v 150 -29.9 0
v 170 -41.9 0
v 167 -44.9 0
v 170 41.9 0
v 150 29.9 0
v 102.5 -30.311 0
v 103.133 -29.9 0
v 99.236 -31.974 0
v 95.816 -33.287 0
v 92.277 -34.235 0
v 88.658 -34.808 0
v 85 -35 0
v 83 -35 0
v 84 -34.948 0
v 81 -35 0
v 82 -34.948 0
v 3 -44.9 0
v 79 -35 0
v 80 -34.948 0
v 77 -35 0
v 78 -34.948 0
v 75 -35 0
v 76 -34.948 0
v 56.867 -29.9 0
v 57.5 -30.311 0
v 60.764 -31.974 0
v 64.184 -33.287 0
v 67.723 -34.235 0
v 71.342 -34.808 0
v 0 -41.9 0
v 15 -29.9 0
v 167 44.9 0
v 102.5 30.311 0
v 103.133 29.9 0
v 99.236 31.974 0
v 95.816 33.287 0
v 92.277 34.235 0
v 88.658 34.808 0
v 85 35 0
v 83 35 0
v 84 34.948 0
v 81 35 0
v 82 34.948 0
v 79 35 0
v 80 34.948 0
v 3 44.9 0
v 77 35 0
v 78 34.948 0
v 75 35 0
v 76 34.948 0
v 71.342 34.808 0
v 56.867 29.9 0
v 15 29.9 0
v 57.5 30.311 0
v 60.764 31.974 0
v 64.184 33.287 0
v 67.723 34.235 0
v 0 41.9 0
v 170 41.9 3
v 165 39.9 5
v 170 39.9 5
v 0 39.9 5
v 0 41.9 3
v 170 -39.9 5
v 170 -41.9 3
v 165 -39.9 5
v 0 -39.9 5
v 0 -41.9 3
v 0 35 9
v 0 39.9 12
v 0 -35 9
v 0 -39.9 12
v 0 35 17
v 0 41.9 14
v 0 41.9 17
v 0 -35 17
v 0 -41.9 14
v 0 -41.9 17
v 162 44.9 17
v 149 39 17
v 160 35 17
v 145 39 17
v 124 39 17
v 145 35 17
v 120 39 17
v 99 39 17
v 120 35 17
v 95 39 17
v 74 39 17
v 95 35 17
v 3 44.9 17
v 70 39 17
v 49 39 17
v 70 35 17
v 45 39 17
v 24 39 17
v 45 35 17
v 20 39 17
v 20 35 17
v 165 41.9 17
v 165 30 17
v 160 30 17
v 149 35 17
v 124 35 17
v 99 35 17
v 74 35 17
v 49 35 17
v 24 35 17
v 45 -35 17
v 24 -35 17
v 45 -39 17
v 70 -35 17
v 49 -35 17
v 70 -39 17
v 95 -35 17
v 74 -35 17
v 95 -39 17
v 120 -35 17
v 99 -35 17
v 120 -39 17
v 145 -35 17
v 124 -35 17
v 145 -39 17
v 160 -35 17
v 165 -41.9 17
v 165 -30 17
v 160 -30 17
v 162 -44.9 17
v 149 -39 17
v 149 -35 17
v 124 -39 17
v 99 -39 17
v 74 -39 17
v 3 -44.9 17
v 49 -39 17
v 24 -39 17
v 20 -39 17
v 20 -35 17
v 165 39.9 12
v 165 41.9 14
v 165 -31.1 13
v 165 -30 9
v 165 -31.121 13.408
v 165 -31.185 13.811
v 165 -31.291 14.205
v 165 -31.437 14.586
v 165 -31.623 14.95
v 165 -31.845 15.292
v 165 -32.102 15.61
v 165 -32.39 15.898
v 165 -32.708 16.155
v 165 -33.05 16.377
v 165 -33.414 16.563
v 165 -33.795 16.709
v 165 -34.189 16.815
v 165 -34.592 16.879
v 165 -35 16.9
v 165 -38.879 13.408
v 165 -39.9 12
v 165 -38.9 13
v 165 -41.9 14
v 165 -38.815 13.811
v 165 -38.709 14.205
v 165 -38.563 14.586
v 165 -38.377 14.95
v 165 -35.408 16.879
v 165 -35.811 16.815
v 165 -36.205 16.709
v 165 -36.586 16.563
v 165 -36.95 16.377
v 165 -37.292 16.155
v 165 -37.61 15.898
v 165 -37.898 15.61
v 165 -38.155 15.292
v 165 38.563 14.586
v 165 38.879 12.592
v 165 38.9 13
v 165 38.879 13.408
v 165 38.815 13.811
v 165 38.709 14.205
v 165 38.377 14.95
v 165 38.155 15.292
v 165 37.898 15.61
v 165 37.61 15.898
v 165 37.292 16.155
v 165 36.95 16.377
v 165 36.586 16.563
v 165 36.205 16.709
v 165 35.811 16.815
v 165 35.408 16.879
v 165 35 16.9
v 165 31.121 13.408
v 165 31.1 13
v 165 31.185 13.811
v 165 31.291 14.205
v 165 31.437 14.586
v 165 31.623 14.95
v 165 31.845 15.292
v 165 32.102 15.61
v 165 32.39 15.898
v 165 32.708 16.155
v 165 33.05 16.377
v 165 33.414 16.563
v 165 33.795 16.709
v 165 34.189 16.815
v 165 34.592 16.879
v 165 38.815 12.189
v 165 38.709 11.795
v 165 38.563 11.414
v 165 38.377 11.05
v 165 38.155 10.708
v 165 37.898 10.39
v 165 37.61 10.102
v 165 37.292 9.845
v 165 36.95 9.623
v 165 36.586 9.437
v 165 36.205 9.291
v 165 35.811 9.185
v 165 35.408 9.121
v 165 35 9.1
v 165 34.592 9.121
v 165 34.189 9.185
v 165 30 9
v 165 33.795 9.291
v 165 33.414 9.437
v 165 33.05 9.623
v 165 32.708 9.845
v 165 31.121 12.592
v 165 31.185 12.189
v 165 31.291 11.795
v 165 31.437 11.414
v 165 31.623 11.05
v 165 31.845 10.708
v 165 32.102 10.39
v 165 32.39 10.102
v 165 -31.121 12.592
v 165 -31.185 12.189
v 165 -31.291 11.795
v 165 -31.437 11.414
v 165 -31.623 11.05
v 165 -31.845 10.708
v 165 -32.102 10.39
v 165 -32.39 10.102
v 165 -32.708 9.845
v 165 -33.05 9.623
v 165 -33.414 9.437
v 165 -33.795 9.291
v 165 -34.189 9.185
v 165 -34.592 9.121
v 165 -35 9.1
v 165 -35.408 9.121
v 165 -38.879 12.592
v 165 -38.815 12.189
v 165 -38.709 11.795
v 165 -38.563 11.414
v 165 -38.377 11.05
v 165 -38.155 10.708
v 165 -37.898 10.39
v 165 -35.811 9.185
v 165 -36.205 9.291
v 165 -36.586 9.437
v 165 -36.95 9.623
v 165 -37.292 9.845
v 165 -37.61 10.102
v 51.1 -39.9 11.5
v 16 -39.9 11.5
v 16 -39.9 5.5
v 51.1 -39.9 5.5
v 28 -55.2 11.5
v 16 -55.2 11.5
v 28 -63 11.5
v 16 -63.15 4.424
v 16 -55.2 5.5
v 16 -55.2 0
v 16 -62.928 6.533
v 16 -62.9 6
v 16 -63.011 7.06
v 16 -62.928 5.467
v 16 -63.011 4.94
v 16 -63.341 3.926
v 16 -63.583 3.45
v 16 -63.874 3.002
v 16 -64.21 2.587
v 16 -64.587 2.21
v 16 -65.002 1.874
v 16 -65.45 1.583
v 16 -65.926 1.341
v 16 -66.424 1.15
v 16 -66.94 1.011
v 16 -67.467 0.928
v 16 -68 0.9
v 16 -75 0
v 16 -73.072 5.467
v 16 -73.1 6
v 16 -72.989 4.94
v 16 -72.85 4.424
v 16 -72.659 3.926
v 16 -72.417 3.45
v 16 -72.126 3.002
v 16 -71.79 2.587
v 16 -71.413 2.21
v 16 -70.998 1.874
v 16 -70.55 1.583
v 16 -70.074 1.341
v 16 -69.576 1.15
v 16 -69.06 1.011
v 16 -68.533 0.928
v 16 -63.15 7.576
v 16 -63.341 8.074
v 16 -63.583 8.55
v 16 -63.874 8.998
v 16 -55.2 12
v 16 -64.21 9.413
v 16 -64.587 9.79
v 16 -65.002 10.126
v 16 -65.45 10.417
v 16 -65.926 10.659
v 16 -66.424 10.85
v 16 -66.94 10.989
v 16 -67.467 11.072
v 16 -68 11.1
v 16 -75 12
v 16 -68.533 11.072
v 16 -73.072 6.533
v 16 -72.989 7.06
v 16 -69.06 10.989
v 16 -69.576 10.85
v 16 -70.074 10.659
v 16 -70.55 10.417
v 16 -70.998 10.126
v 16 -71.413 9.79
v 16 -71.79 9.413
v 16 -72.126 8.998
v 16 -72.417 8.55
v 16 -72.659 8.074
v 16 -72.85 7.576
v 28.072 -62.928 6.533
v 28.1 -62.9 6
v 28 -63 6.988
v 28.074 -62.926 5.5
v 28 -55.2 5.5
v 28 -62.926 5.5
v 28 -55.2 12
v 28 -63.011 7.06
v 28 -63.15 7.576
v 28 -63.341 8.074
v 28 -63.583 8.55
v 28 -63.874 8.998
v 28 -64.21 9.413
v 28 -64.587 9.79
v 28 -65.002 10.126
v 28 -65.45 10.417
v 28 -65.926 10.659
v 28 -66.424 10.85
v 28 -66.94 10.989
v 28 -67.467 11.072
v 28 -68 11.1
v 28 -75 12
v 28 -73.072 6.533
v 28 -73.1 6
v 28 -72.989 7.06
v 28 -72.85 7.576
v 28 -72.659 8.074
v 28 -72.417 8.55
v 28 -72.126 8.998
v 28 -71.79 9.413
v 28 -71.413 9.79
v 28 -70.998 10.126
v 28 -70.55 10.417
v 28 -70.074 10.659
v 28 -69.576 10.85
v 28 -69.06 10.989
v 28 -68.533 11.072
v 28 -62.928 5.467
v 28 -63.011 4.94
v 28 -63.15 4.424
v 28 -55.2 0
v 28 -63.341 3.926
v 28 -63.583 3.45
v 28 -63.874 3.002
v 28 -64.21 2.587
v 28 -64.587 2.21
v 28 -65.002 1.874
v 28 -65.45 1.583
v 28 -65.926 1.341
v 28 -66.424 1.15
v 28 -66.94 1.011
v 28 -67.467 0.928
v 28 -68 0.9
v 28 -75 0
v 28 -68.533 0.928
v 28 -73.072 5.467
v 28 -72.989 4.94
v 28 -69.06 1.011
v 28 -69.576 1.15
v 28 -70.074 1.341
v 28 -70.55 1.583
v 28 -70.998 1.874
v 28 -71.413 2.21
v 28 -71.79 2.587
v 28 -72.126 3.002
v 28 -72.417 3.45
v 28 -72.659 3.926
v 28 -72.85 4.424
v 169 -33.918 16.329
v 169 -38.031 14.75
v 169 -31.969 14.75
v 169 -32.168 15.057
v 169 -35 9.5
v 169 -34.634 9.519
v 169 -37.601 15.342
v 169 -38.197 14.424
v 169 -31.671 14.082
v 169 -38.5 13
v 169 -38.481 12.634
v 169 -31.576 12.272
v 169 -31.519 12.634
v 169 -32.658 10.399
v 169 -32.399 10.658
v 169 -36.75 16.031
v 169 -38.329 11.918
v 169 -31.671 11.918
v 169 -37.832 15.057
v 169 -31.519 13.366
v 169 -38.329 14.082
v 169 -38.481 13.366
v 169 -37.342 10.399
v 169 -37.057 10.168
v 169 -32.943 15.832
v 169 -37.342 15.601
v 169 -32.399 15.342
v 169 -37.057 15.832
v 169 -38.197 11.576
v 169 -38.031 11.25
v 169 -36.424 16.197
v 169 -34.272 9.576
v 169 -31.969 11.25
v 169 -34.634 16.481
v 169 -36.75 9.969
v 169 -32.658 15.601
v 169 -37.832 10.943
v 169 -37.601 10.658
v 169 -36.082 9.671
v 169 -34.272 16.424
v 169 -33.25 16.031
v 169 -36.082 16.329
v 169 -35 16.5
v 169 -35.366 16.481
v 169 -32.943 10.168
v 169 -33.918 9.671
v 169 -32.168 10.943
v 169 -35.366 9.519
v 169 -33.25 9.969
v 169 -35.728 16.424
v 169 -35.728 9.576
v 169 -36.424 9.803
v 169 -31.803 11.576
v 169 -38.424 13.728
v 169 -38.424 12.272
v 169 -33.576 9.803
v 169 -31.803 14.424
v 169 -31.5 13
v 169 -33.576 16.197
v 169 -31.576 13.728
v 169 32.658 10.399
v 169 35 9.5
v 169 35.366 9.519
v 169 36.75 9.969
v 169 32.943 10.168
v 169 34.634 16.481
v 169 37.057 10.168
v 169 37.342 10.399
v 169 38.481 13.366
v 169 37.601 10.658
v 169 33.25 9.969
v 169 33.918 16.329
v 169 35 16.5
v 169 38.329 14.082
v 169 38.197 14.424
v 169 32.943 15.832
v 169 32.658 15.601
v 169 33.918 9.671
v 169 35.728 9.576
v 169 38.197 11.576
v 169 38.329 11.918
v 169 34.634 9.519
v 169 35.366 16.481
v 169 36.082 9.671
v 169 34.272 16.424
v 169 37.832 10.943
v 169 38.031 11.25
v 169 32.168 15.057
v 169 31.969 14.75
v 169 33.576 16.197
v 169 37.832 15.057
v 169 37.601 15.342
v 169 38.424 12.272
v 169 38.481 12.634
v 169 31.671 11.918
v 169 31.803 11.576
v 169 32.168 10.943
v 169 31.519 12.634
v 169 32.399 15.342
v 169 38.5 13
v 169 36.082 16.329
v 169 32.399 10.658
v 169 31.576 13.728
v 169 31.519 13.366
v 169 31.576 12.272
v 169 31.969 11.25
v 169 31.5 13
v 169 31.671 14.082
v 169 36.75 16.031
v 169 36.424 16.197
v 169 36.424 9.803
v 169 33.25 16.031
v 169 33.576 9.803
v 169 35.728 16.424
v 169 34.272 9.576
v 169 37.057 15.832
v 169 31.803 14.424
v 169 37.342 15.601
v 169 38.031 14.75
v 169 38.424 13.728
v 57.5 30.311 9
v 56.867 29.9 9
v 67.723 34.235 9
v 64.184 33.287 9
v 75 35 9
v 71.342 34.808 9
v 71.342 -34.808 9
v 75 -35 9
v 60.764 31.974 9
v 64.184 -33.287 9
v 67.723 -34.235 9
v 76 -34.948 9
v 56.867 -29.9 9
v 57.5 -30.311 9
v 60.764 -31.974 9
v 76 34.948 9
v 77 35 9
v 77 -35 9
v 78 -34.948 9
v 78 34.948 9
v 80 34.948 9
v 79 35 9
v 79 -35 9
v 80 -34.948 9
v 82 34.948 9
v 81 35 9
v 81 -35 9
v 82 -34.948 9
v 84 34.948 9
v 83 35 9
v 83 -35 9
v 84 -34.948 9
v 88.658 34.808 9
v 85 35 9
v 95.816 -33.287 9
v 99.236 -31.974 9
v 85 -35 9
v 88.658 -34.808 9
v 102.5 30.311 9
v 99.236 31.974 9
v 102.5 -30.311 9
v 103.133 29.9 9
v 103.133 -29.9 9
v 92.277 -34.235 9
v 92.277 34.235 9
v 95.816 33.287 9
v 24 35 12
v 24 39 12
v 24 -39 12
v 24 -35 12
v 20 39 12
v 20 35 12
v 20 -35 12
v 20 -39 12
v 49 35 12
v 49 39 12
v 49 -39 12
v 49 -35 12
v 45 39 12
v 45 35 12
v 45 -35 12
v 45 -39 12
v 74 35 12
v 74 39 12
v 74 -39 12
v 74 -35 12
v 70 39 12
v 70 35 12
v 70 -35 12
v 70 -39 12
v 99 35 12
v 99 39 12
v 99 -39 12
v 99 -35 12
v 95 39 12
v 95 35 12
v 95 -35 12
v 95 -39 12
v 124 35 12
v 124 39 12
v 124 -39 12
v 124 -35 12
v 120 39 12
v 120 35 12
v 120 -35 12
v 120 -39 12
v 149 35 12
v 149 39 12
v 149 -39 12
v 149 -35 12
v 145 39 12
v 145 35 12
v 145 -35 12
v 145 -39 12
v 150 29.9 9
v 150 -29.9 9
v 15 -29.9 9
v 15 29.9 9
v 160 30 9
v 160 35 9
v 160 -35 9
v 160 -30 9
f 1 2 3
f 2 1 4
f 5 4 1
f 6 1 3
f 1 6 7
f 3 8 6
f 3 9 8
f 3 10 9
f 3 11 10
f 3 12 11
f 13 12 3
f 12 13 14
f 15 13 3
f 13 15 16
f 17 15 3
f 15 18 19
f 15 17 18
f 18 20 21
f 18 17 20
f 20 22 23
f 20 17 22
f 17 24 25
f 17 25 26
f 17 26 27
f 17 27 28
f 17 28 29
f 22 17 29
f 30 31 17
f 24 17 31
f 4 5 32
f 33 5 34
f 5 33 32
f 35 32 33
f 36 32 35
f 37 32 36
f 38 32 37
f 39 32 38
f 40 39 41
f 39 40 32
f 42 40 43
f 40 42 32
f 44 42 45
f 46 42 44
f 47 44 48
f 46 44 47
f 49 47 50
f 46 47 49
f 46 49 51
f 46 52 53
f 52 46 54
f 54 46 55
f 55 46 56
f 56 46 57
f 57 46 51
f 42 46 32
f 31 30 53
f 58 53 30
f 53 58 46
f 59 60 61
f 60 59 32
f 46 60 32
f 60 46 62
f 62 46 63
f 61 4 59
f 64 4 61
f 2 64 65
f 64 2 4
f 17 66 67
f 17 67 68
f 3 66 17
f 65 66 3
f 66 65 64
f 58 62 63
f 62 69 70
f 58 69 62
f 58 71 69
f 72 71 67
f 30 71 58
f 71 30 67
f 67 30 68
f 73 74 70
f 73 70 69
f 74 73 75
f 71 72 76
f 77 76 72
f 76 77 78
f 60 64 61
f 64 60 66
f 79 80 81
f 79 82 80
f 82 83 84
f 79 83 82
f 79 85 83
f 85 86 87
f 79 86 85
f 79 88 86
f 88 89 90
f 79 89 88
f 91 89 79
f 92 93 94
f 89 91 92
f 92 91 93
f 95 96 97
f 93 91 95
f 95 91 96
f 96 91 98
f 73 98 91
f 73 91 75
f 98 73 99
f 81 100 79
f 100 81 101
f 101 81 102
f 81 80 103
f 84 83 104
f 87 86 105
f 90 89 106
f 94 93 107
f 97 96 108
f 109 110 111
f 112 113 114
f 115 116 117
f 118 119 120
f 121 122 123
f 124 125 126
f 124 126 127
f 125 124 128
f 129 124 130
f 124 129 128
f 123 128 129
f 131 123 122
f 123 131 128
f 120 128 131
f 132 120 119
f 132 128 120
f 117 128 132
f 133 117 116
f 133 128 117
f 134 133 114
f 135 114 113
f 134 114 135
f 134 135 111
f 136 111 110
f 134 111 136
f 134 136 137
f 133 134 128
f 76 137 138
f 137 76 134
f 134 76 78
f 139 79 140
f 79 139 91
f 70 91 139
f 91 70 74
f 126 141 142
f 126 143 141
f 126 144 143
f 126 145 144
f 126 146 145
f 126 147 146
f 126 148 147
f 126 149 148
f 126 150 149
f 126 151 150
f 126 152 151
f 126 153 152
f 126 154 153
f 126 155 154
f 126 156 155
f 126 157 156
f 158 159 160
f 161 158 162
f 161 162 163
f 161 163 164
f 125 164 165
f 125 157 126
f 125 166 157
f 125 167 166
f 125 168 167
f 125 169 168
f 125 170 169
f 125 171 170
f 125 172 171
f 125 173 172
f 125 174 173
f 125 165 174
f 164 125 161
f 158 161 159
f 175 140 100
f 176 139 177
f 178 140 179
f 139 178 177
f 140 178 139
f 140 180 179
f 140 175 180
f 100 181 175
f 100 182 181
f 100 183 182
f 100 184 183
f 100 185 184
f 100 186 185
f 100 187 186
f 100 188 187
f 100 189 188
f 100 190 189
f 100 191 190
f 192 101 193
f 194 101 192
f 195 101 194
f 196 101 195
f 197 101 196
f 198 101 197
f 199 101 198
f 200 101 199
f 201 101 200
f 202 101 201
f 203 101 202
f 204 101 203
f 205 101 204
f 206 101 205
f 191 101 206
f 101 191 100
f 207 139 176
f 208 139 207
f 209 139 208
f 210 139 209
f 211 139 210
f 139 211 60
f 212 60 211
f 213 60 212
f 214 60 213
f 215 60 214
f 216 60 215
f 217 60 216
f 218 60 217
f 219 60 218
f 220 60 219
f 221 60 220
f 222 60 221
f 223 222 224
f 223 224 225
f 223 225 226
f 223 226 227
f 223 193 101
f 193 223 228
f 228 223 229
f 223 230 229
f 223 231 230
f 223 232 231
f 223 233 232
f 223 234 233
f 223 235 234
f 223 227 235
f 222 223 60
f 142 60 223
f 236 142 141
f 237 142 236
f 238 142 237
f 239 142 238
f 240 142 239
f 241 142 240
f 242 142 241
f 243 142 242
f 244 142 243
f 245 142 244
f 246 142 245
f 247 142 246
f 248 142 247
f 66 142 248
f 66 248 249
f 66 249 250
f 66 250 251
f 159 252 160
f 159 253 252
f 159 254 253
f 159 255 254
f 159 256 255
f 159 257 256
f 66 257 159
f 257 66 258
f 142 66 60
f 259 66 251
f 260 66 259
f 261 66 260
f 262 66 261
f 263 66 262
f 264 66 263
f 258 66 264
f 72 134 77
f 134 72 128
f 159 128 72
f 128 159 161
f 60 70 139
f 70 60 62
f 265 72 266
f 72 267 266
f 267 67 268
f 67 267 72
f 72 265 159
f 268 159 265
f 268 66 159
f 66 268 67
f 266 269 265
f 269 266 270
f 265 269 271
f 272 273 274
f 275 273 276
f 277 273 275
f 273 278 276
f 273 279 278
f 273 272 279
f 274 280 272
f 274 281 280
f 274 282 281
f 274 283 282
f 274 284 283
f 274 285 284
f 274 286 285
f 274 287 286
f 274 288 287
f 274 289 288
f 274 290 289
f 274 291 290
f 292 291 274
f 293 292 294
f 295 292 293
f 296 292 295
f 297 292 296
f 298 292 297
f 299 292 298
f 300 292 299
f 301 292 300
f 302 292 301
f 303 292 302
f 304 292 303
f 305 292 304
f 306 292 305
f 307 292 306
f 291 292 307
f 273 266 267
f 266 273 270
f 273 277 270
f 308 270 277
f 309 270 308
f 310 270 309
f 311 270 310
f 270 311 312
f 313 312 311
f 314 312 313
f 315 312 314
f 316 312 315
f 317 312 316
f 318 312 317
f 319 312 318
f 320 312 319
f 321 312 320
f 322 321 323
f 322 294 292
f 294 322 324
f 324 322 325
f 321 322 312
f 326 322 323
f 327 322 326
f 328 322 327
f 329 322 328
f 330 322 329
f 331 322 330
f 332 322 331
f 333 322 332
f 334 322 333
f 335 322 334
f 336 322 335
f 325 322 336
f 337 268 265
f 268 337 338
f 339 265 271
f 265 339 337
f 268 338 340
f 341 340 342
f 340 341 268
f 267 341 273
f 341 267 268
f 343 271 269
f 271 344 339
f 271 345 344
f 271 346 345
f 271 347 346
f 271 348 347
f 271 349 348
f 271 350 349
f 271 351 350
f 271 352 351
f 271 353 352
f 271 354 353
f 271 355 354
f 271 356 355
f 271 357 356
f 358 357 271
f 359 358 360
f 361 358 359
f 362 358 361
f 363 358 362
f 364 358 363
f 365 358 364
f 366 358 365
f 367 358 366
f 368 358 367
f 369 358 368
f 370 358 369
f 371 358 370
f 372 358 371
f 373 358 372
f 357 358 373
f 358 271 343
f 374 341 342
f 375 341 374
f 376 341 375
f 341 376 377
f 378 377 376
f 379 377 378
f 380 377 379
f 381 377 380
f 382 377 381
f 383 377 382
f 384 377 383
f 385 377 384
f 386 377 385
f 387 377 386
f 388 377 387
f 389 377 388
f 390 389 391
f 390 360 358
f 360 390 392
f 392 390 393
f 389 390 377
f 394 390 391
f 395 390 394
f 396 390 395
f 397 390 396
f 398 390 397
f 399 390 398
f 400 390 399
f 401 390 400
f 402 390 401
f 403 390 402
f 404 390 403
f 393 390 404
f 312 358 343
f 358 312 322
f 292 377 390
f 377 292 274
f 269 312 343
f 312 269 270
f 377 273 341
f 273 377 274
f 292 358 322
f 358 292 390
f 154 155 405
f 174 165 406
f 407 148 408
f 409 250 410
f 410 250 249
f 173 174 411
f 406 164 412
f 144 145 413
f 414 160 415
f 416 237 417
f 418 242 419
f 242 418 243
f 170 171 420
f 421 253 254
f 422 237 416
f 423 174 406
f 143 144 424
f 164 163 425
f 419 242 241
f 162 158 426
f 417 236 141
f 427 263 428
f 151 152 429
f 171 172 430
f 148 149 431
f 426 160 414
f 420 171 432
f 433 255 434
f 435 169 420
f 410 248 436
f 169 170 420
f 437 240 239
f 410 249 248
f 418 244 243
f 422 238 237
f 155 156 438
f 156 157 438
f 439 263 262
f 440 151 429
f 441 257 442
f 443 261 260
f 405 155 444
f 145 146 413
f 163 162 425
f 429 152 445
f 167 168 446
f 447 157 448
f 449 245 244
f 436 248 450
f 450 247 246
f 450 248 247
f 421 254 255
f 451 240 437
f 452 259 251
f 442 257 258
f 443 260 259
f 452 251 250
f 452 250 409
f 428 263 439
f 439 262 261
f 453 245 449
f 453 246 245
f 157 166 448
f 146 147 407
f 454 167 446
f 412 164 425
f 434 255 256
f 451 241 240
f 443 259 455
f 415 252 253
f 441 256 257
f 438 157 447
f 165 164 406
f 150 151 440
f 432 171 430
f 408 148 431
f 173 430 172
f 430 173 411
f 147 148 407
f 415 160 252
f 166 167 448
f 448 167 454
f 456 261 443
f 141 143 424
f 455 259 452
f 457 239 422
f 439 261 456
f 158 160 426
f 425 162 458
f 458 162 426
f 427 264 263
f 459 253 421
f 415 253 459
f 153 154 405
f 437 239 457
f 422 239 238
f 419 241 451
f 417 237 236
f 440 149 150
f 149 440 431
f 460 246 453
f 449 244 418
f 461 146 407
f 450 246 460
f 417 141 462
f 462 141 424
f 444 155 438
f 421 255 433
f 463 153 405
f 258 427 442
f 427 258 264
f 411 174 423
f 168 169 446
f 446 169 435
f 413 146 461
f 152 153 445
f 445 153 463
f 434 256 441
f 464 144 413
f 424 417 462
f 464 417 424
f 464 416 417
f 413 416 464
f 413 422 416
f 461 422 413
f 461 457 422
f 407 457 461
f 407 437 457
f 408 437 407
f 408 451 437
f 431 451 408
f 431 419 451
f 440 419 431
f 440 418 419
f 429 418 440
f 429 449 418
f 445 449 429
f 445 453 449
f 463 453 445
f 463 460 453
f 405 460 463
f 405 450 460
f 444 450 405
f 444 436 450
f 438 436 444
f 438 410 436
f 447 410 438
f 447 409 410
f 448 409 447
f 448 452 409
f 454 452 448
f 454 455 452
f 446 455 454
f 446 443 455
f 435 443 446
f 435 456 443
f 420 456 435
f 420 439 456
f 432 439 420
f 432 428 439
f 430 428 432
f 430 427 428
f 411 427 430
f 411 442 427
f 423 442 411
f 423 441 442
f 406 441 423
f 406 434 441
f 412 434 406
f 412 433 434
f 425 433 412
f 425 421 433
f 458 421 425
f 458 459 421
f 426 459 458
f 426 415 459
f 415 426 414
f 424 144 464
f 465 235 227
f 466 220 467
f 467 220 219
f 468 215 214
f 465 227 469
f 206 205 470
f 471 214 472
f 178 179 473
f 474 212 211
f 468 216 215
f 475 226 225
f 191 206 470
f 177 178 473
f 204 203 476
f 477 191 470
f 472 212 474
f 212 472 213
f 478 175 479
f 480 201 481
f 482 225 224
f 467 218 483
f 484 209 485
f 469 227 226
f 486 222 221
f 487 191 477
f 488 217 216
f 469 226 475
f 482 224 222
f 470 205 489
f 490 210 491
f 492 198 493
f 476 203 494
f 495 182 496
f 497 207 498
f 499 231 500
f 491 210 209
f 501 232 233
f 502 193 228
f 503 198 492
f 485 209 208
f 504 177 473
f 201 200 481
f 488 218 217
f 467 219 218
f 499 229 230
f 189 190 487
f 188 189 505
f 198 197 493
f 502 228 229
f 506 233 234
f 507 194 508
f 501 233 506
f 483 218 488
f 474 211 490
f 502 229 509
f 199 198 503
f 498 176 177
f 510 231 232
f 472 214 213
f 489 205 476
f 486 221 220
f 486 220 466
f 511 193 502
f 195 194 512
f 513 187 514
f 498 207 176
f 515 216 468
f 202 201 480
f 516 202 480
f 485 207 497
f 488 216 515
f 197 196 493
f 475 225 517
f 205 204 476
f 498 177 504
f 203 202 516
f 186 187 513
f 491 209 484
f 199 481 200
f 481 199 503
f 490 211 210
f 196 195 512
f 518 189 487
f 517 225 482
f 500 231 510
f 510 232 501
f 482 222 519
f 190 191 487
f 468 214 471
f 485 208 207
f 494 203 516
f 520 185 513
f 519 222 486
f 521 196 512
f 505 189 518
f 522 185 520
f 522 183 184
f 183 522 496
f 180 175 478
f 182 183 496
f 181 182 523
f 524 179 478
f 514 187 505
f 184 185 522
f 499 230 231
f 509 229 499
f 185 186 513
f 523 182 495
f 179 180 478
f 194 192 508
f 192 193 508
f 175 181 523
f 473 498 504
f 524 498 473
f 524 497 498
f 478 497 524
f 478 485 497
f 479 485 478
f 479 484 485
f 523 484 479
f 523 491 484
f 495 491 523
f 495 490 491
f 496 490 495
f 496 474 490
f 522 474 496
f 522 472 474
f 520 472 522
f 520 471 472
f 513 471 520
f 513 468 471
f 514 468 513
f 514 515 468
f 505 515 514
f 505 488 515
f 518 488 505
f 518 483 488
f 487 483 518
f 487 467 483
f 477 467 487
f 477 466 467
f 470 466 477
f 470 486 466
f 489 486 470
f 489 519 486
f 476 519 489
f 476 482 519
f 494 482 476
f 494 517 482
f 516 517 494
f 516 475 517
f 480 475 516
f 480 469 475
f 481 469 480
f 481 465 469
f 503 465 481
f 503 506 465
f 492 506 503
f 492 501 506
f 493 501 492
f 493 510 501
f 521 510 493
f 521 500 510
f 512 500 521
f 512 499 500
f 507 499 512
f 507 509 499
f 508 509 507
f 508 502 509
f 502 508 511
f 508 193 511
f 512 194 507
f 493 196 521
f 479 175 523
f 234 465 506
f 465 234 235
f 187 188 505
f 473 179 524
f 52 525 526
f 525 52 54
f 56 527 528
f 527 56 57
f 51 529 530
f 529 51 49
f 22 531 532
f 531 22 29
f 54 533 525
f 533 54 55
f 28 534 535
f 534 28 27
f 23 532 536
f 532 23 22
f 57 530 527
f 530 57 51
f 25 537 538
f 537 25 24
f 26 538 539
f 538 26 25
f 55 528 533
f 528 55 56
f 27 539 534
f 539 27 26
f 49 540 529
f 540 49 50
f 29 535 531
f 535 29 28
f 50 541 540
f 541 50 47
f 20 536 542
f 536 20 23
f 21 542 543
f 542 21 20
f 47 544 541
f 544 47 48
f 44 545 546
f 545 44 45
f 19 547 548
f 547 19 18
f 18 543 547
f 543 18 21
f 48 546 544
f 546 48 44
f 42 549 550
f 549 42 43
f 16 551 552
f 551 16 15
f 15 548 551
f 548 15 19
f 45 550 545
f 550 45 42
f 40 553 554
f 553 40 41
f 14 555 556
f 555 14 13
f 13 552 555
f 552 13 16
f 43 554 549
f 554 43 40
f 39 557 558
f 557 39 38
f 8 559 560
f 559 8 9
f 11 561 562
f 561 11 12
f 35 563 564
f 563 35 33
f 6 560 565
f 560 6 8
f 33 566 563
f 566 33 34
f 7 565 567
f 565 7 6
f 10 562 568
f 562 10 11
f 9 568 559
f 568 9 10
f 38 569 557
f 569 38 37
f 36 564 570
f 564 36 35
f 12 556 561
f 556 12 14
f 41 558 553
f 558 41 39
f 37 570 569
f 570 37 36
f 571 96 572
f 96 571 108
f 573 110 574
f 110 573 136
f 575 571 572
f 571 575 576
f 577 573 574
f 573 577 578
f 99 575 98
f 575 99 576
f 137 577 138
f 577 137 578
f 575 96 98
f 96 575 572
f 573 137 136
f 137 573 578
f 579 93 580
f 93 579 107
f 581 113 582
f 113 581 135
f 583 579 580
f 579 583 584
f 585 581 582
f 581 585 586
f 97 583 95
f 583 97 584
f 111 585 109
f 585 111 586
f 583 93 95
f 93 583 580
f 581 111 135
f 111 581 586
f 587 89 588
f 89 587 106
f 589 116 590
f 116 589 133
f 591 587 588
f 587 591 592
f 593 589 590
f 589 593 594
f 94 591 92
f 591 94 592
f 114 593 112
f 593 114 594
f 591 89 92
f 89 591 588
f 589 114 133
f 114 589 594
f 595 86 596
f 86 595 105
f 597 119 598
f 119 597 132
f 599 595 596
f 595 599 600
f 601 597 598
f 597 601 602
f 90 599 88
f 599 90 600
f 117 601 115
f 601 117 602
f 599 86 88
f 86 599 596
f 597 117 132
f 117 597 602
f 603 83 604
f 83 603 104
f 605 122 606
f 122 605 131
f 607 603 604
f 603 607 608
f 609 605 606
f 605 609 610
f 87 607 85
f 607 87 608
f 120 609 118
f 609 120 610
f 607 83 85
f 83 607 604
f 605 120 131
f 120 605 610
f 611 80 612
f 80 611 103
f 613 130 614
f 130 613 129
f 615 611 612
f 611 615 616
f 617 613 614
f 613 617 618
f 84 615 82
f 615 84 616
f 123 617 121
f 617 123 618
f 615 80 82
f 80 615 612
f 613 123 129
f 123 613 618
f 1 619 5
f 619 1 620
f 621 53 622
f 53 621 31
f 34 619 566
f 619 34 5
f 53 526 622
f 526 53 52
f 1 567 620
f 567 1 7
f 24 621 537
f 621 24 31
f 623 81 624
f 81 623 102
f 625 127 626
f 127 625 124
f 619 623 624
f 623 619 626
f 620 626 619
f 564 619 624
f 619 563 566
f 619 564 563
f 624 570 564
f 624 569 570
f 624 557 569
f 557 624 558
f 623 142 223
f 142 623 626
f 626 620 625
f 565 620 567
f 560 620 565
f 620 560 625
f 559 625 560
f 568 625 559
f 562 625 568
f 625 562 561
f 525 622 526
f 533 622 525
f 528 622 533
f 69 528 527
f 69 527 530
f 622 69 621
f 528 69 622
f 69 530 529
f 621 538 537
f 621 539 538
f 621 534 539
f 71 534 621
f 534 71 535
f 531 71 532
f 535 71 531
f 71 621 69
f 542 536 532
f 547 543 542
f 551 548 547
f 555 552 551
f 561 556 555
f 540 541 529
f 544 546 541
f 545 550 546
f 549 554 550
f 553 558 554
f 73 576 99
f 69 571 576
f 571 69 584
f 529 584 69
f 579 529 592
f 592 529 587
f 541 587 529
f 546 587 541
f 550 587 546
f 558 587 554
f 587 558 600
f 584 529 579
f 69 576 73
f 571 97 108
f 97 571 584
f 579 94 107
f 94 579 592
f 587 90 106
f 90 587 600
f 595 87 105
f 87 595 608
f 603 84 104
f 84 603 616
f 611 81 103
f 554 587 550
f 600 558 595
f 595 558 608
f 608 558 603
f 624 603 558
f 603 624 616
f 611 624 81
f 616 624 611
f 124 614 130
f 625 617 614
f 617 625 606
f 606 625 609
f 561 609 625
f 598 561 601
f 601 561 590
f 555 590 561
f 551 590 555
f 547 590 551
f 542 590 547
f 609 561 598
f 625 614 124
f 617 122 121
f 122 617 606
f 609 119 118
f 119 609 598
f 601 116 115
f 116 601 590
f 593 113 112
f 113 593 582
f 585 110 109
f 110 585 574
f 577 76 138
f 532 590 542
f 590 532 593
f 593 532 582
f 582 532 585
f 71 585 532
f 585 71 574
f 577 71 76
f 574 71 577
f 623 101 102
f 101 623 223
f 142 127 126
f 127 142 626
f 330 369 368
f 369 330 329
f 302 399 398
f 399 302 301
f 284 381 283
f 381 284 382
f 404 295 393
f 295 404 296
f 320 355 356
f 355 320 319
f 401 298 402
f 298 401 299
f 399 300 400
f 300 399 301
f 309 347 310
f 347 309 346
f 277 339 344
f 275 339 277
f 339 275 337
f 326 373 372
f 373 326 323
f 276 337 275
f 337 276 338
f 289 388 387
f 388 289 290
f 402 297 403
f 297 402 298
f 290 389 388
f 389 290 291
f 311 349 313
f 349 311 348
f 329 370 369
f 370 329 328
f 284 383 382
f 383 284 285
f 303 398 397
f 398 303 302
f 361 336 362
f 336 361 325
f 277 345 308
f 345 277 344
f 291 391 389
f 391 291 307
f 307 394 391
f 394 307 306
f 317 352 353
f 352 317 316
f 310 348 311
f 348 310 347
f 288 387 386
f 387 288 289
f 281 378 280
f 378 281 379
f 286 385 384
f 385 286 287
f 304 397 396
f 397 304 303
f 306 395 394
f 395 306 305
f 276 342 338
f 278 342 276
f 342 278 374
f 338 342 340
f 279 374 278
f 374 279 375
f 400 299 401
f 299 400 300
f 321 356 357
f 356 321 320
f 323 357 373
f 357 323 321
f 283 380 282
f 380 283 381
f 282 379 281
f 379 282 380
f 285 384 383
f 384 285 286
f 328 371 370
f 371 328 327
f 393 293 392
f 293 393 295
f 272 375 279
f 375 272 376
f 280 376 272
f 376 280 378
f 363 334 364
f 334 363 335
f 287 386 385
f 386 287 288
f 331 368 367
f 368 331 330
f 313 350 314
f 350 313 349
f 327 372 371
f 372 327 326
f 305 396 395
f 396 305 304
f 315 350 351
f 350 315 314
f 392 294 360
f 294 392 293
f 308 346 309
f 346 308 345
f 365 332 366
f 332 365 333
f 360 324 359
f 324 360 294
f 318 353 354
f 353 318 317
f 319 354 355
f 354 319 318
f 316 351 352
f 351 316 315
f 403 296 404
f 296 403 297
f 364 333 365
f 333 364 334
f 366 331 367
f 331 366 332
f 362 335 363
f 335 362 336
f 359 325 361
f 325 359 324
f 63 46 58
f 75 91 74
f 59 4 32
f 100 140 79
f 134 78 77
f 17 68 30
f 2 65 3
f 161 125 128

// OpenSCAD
// file: config_4x5.scad
/*
This is the base configuration file for the 4x5" format
# we are not using the exact ANSI measures, but slightly rounded measures for slight simplification
*/

// general tolerance
vTolerance = 0.2;

// sheet film and cassette measurements
vFilmSheet_l = 102;
vFilmSheet_w = 127;
vCassette_l = 160; // A min
vCassette_w = 121; // B max
vCassette_h = 13.2; // C max
vLightTrap_l = 2; // M2
vLightTrap_w = vCassette_w;
vLightTrap_h = 1.5; // M1
vLightTrap_offsetX = 141; // G max
vFilmWindow_l = 119;
vFilmWindow_w = 100;
vFilmWindow_offsetX = 16;
vGroundGlass_offsetZ = 5;

// Graflok?

// lens board measures (we are using Wista/Technika-style lensboards)
vLensboard_l = 100;
vLensboard_w = 97;
vLensboard_h = 2;
vLensboard_offsetX = -(vLensboard_l+3)/2; // caution: we have an asymetric offset!
vLensboard_offsetY = -vLensboard_w/2;
vLensboardHole_d = 85;
vLensboardLighttrap_d = 89;
vLensboardLighttrap_h = 1+vTolerance;

// bellows frame measures - the bellows frame design is derived from standardcameras.com
vBellowsBackInner_l = 144; //???? check
vBellowsBackInner_w = vBellowsBackInner_l;
vBellowsBackOuter_l = vBellowsBackInner_l+1;
vBellowsBackOuter_w = vBellowsBackOuter_l;

vBellowsBackFrameOuter_l = 159;
vBellowsBackFrameOuter_w = vBellowsBackFrameOuter_l;
vBellowsBackFrameOuter_h = 7;
vBellowsBackFrameInner_l = 135;
vBellowsBackFrameInner_w = vBellowsBackFrameInner_l;
vBellowsBackFrameInner_h = 5;

vBellowsBackLightTrapOuter_l = vBellowsBackFrameInner_l+2*2;
vBellowsBackLightTrapOuter_w = vBellowsBackLightTrapOuter_l;
vBellowsBackLightTrap_h = 3;

vBellowsFrameScrewHole_d = 2;
vBellowsFrameScrewHole_h = 10;
vBellowsFrameScrewHole_offsetXY = 70;
vBellowsFrameScrewHole_offsetZ = vBellowsBackFrameOuter_h/2;

// body dimensions
vWall_strength = 5;
vBodyOuter_l = 185; // make sure this is at least 4*vWall_strength larger than vBellowsBackFrameOuter_l!
vBodyOuter_w = 170; // make sure this is at least 2*vWall_strength larger than vBellowsBackFrameOuter_l!
vBodyOuter_h = 65;
vBodyEdge_r = vWall_strength;

// we will center our model on the Y axis and on the center of the bellows frame
// at least for the 4x5 version, we have to do an asymetric offset of 2.5mm on the X-axis 
vAsymOffsetX = -2.5;  

// back plate
vBackPlateLength = 160; // we will probably use about the same size as the bellows back frame
vBackPlateStrength = vWall_strength;

// hinges for front lid
vHingeInnerDistance = 100;
vHingeBaseWidth = 20;
vHingeHole = 5;

// lid lock measures
vLidLockBase_d = 8;
vLidLockHole_distance = 70;

// rail dimensions
vLowerRail_w = 90;
vUpperRail_w = vLowerRail_w;

// cutout for stop indents
vStopIndent_l = 4;
vStopIndent_h = 5;
vStopIndentDistance = 25; // shorter than 25 is not necessary
vStopIndent_offsetX = 20; // don't go shorter than 20 if you intend to use a 90mm lens!


// for all dovetails we use a base width of 5mm and a base height of 5mm
// we are applying tolerances to the inner AND outer part of a dovetail, in width and height
vDoveTail_w = 5;
vDoveTail_h = 5;
vDoveTail_tolerance = 0.2;

// focusing rod
vFocusingRod_d = 6;
vFocusingKnob_d = 25;
vFocusingKnob_h = 20;

// stabilizer measures (just the outer measures of our stabilizer block, not the tripod slider)
vStabilizerBase_l = 140;
vStabilizerBase_w = 100;  
vStabilizerBase_h = 7;
vStabilizerDovetailBase_w = 50;
// screw holes for the stabilizer
vLidHoleCount_x = 5;
vLidHoleDist_x = 35;
vLidHoleCount_y = 2;
vLidHoleDist_y = 60;


// screw diameters, length is individually set
vScrew1Hole_d = 3;
vScrew1ThreadHole_d = 2.2;
vScrew2Hole_d = 2;
vScrew2ThreadHole_d = 1.4;


 
// file: modules.scad
/*
This is a collection of the modules which are used heavily within the whole project.
Almost all parts rely on the modules to remain "as is", especially regarding their current orientation.
So please act very carefully here, otherwise you may screw up the complete design!

*/

// roof module - this is heavily used for dovetail cutouts
// please keep as is
module roof(l, w, h){
    polyhedron(
        points=[
            [0,0,0],
            [l,0,0],
            [l,w,0],
            [0,w,0],
            [0,w/2,h],
            [l,w/2,h]
            ],
        faces=[
            [0,1,2,3],
            [0,4,1],
            [1,4,5,2],
            [2,5,3],
            [3,5,4,0]
            ]
            );
    };

// a wedge module - this is heavily used for cutting edges
// please keep as is    
module wedge(l, w, h) {
    polyhedron(
            points=[
                [0,0,0],
                [l,0,0],
                [l,w,0],
                [0,w,0],
                [0,0,h],
                [l,0,h]
            ],
            faces=[
                [0,3,2,1],
                [0,1,5,4],
                [1,2,5],
                [2,3,4,5],
                [3,0,4]
            ]
    );
   };

// simple tube module.   
module tube(d1, d2, h) {
    difference() {
        cylinder(d=d1, h=h);
        cylinder(d=d2, h=h);
        };
    };

// mainly used for making holes for countersunk screws
// please keep as is    
module countersunk_screw(vScrew_d, vScrew_l){
    union(){
    cylinder(d=vScrew_d, h= vScrew_l);
    cylinder(d1=vScrew_d*2, h=vScrew_d);
    };
};

// module for making hexagons, e.g. hex nuts. kw is the key width
// please keep as is
module hex(kw, h) {
	render()
        translate([0, 0, h/2])
            intersection_for(a = [0, 120, 240]) {
                rotate([0, 0, a])
                    cube([kw, 3 * kw, h], true);
                }
}
// file: baseconfig.scad
/*
Here we define some variables which are independent from the camera format
*/


// some generic variables
$fn = 60; // we are using 60 fragments for cylinders and similar objects

// we are including a format specific configuration sheet - but make sure to include only one!

include <config_4x5.scad>;
// include <config_5x7.scad>;
// include <config_8x10.scad>;

// Arca Swiss tripod plate
// caution: some Arca Swiss compatible tripod heads may have slight variations
// vArca_length = xx; // the length is irrelevant here
vArca_width = 38;
vArca_height = 7;
vArcaBase_cutout = 4;
vArcaBase_height = 1.5;
// main file
// loading the base configuration
include <baseconfig.scad>;

// some modules such as hex, countersunk screws, roof, wedge are available in a module file
use <modules.scad>;
    
// some measures in here are hard wired based on the experience with the first prototype. Normally there is no need to change them (except a measure is hinted with "adapt")


vRailTolerance = vTolerance;
    
vLowerRail_l = vBodyOuter_l-15; // we need 5mm space to move backwards for the lid lock
vLowerRailOuter_w = vLowerRail_w-vRailTolerance;
vLowerRailInner_w = vLowerRail_w-(2*vDoveTail_w)-vRailTolerance;
vLowerRail_h = vDoveTail_h;
vLowerRail_offsetX = 0;
vLowerRail_offsetY = -vLowerRailOuter_w/2;
vLowerRail_offsetZ = 0;

vUpperRail_l = vLowerRail_l-5;
vUpperRailOuter_w = vLowerRailOuter_w;
vUpperRail_h = vLowerRail_h;
vUpperRail_offsetX = 0;
vUpperRail_offsetY = -(vUpperRailOuter_w/2);
vUpperRail_offsetZ = 0;

vMidSection_h = 7; // 7 should fit for 4x5 and 5x7

vUpperBlock_l = vUpperRail_l;
vUpperBlock_w = vLowerRailInner_w;
vUpperBlock_h = vUpperRail_h + vMidSection_h;
vUpperBlock_offsetX = 0;
vUpperBlock_offsetY = -vUpperBlock_w/2;
vUpperBlock_offsetZ = vLowerRail_h;

vMidCutout_l = vUpperRail_l-30;
vMidCutout_w = vLowerRailOuter_w-30;
vMidCutout_h = vLowerRail_h+vUpperBlock_h;
vMidCutout_offsetX = 15;
vMidCutout_offsetY = -vMidCutout_w/2;
vMidCutout_offsetZ = 0;

vUpperCutout_l = vUpperRail_l-5;
vUpperCutout_w = vUpperRailOuter_w-(4*vDoveTail_w)+vRailTolerance;
vUpperCutout_h = vMidSection_h+1;
vUpperCutout_offsetX = 0;
vUpperCutout_offsetY = -vUpperCutout_w/2;
vUpperCutout_offsetZ = vMidCutout_h-vUpperCutout_h;

vFrontCutout_l = vUpperRail_l;
vFrontCutout_w = vUpperCutout_w-10;
vFrontCutout_h = vUpperCutout_h;
vFrontCutout_offsetX = 0;
vFrontCutout_offsetY = -vFrontCutout_w/2;
vFrontCutout_offsetZ = vUpperCutout_offsetZ;

vLensCutout_d = vUpperCutout_w; 
vLensCutout_h = vLowerRail_h+vUpperBlock_h;
vLensCutout_offsetX = (vLowerRail_l/2)-10; 
vLensCutout_offsetY = 0;
vLensCutout_offsetZ = 0;

// cutout for stop indents
vStopIndent_w = vUpperCutout_w + (2*vStopIndent_l);
vStopIndentCount = floor(vUpperRail_l/vStopIndentDistance);
vStopIndent_offsetY = -vStopIndent_w/2;
vStopIndent_offsetZ = vLowerRail_h+vMidSection_h+vUpperRail_h-vStopIndent_h;

vFocusingLever_w = (vBodyOuter_w/2)-10;
vFocusingLever_l = vFocusingLever_w;
vFocusingLever_h = vMidSection_h-1;
vFocusingLever_offsetX = 16; // manually set, probably no need to change things here
vFocusingLever_offsetY = 0;
vFocusingLever_offsetZ = vLowerRail_h + vFocusingLever_h + 0.5;

vFocusingThreadBlock_l = 12; // as long as we keep T5 or T6 rods, there's no need to change things here
vFocusingThreadBlock_w = 20-vTolerance;
vFocusingThreadBlock_h = 12;
vFocusingThreadBlock_offsetX = vFocusingLever_offsetX;
vFocusingThreadBlock_offsetY = -vFocusingLever_w;
vFocusingThreadBlock_offsetZ = 0;

vFocusingThreadHole_d = 10+vTolerance; // T6 = 10, T5 = 8
vFocusingThreadHole_h = vFocusingLever_l;
vFocusingThreadHole_offsetX = vFocusingLever_offsetX;
vFocusingThreadHole_offsetY = -vFocusingLever_w+7; // don't change this, unless you also check the corresponding value for front lid and focusing block
vFocusingThreadHole_offsetZ = 6;


vLidLock_d1 = vLidLockBase_d-vTolerance;
vLidLock_d2 = vLidLockBase_d-1; // we make cones, so it is easier to lock
vLidLock_h = 4;
vLidLock_offsetX = vUpperRail_l; // we need a locking lenght of about 4mm
vLidLock_offsetY = -vLidLockHole_distance/2; // double check if this fits to the upper rail width!
vLidLock_offsetZ = 5+vLidLockBase_d;

vEdgeCutoff = 3;
vEdgeCutoff_h = vLowerRail_h+vMidSection_h+vUpperRail_h;


difference(){
union(){
    // lower rail
    difference(){
        translate([vLowerRail_offsetX, vLowerRail_offsetY, vLowerRail_offsetZ])
            roof(vLowerRail_l, vLowerRailOuter_w, vLowerRailOuter_w/2);
        translate([vLowerRail_offsetX, vLowerRail_offsetY, vLowerRail_h])
            cube([vLowerRail_l, vLowerRailOuter_w, vLowerRailOuter_w/2]);    
    };

    // upper block
    translate([vUpperBlock_offsetX, vUpperBlock_offsetY, vUpperBlock_offsetZ])
            cube([vUpperBlock_l, vUpperBlock_w, vUpperBlock_h]);    
    
    // focusing lever
    translate([vFocusingLever_offsetX, vFocusingLever_offsetY, vFocusingLever_offsetZ])
        rotate([0, 90, 0])
            wedge(vFocusingLever_h, -vFocusingLever_w, vFocusingLever_l);
    
    
    // focusing lever thread block
    translate([vFocusingThreadBlock_offsetX, vFocusingThreadBlock_offsetY, vFocusingThreadBlock_offsetZ])
                cube([vFocusingThreadBlock_l, vFocusingThreadBlock_w, vFocusingThreadBlock_h]);
        
    // lid lock bolts
    translate([vLidLock_offsetX, vLidLock_offsetY, vLidLock_offsetZ])
        rotate([0, 90, 0])
            cylinder(d1=vLidLock_d1, d2=vLidLock_d2, h=vLidLock_h);
    translate([vLidLock_offsetX, -vLidLock_offsetY, vLidLock_offsetZ])
        rotate([0, 90, 0])
            cylinder(d1=vLidLock_d1, d2=vLidLock_d2, h=vLidLock_h);
    
    // lower rail
    translate([0,0,vLowerRail_h+vUpperBlock_h])
        mirror([0,0,1]){
            difference(){
                translate([vUpperRail_offsetX, vUpperRail_offsetY, vUpperRail_offsetZ])
                    roof(vUpperRail_l, vUpperRailOuter_w, vUpperRailOuter_w/2);
                translate([vUpperRail_offsetX, vUpperRail_offsetY, vUpperRail_h])
                    cube([vUpperRail_l, vUpperRailOuter_w, vUpperRailOuter_w/2]);    
            };
        };

    };
    
    // mid cutout
    translate([vMidCutout_offsetX, vMidCutout_offsetY, vMidCutout_offsetZ])
        cube([vMidCutout_l, vMidCutout_w, vMidCutout_h]); 
 
    // upper cutout
    translate([vUpperCutout_offsetX, vUpperCutout_offsetY, vUpperCutout_offsetZ])
        cube([vUpperCutout_l, vUpperCutout_w, vUpperCutout_h]);
   
    // front cutout
    translate([vFrontCutout_offsetX, vFrontCutout_offsetY, vFrontCutout_offsetZ])
        cube([vFrontCutout_l, vFrontCutout_w, vFrontCutout_h]);
    
    for (i = [0:5]){ 
    // lens cutout
    translate([vLensCutout_offsetX+(i*2), vLensCutout_offsetY, vLensCutout_offsetZ])
        cylinder(d=vLensCutout_d, h=vLensCutout_h);
    };
    
    // stop indents
    for (i=[0:vStopIndentCount]){
    translate([i*vStopIndentDistance+vStopIndent_offsetX, vStopIndent_offsetY, vStopIndent_offsetZ])
        cube([vStopIndent_l, vStopIndent_w, vStopIndent_h]);        
    };

    // focusing thread hole
    translate([vFocusingThreadHole_offsetX, vFocusingThreadHole_offsetY, vFocusingThreadHole_offsetZ])
        rotate([0, 90, 0])
            cylinder(d=vFocusingThreadHole_d, h=vFocusingThreadHole_h);
    
    // edge cutoff
    // back left
    translate([0, -vLowerRail_offsetY, 0])
        rotate([0, -90, 0])
            wedge(vEdgeCutoff_h, -vEdgeCutoff, -vEdgeCutoff);
    // lower front left
    translate([vLowerRail_l, -vLowerRail_offsetY, 0])
        rotate([0, -90, 0])
            wedge(vEdgeCutoff_h, -vEdgeCutoff, vEdgeCutoff);
    // upper front left
    translate([vUpperRail_l, -vLowerRail_offsetY, vLowerRail_h])
        rotate([0, -90, 0])
            wedge(vEdgeCutoff_h, -vEdgeCutoff, vEdgeCutoff);
    // back right
    translate([0, vLowerRail_offsetY, 0])
        rotate([0, -90, 0])
            wedge(vEdgeCutoff_h, vEdgeCutoff, -vEdgeCutoff);
    // lower front right
    translate([vLowerRail_l, vLowerRail_offsetY, 0])
        rotate([0, -90, 0])
            wedge(vEdgeCutoff_h, vEdgeCutoff, vEdgeCutoff);
    // upper front right
    translate([vUpperRail_l, vLowerRail_offsetY, vLowerRail_h])
        rotate([0, -90, 0])
            wedge(vEdgeCutoff_h, vEdgeCutoff, vEdgeCutoff);
    
};
